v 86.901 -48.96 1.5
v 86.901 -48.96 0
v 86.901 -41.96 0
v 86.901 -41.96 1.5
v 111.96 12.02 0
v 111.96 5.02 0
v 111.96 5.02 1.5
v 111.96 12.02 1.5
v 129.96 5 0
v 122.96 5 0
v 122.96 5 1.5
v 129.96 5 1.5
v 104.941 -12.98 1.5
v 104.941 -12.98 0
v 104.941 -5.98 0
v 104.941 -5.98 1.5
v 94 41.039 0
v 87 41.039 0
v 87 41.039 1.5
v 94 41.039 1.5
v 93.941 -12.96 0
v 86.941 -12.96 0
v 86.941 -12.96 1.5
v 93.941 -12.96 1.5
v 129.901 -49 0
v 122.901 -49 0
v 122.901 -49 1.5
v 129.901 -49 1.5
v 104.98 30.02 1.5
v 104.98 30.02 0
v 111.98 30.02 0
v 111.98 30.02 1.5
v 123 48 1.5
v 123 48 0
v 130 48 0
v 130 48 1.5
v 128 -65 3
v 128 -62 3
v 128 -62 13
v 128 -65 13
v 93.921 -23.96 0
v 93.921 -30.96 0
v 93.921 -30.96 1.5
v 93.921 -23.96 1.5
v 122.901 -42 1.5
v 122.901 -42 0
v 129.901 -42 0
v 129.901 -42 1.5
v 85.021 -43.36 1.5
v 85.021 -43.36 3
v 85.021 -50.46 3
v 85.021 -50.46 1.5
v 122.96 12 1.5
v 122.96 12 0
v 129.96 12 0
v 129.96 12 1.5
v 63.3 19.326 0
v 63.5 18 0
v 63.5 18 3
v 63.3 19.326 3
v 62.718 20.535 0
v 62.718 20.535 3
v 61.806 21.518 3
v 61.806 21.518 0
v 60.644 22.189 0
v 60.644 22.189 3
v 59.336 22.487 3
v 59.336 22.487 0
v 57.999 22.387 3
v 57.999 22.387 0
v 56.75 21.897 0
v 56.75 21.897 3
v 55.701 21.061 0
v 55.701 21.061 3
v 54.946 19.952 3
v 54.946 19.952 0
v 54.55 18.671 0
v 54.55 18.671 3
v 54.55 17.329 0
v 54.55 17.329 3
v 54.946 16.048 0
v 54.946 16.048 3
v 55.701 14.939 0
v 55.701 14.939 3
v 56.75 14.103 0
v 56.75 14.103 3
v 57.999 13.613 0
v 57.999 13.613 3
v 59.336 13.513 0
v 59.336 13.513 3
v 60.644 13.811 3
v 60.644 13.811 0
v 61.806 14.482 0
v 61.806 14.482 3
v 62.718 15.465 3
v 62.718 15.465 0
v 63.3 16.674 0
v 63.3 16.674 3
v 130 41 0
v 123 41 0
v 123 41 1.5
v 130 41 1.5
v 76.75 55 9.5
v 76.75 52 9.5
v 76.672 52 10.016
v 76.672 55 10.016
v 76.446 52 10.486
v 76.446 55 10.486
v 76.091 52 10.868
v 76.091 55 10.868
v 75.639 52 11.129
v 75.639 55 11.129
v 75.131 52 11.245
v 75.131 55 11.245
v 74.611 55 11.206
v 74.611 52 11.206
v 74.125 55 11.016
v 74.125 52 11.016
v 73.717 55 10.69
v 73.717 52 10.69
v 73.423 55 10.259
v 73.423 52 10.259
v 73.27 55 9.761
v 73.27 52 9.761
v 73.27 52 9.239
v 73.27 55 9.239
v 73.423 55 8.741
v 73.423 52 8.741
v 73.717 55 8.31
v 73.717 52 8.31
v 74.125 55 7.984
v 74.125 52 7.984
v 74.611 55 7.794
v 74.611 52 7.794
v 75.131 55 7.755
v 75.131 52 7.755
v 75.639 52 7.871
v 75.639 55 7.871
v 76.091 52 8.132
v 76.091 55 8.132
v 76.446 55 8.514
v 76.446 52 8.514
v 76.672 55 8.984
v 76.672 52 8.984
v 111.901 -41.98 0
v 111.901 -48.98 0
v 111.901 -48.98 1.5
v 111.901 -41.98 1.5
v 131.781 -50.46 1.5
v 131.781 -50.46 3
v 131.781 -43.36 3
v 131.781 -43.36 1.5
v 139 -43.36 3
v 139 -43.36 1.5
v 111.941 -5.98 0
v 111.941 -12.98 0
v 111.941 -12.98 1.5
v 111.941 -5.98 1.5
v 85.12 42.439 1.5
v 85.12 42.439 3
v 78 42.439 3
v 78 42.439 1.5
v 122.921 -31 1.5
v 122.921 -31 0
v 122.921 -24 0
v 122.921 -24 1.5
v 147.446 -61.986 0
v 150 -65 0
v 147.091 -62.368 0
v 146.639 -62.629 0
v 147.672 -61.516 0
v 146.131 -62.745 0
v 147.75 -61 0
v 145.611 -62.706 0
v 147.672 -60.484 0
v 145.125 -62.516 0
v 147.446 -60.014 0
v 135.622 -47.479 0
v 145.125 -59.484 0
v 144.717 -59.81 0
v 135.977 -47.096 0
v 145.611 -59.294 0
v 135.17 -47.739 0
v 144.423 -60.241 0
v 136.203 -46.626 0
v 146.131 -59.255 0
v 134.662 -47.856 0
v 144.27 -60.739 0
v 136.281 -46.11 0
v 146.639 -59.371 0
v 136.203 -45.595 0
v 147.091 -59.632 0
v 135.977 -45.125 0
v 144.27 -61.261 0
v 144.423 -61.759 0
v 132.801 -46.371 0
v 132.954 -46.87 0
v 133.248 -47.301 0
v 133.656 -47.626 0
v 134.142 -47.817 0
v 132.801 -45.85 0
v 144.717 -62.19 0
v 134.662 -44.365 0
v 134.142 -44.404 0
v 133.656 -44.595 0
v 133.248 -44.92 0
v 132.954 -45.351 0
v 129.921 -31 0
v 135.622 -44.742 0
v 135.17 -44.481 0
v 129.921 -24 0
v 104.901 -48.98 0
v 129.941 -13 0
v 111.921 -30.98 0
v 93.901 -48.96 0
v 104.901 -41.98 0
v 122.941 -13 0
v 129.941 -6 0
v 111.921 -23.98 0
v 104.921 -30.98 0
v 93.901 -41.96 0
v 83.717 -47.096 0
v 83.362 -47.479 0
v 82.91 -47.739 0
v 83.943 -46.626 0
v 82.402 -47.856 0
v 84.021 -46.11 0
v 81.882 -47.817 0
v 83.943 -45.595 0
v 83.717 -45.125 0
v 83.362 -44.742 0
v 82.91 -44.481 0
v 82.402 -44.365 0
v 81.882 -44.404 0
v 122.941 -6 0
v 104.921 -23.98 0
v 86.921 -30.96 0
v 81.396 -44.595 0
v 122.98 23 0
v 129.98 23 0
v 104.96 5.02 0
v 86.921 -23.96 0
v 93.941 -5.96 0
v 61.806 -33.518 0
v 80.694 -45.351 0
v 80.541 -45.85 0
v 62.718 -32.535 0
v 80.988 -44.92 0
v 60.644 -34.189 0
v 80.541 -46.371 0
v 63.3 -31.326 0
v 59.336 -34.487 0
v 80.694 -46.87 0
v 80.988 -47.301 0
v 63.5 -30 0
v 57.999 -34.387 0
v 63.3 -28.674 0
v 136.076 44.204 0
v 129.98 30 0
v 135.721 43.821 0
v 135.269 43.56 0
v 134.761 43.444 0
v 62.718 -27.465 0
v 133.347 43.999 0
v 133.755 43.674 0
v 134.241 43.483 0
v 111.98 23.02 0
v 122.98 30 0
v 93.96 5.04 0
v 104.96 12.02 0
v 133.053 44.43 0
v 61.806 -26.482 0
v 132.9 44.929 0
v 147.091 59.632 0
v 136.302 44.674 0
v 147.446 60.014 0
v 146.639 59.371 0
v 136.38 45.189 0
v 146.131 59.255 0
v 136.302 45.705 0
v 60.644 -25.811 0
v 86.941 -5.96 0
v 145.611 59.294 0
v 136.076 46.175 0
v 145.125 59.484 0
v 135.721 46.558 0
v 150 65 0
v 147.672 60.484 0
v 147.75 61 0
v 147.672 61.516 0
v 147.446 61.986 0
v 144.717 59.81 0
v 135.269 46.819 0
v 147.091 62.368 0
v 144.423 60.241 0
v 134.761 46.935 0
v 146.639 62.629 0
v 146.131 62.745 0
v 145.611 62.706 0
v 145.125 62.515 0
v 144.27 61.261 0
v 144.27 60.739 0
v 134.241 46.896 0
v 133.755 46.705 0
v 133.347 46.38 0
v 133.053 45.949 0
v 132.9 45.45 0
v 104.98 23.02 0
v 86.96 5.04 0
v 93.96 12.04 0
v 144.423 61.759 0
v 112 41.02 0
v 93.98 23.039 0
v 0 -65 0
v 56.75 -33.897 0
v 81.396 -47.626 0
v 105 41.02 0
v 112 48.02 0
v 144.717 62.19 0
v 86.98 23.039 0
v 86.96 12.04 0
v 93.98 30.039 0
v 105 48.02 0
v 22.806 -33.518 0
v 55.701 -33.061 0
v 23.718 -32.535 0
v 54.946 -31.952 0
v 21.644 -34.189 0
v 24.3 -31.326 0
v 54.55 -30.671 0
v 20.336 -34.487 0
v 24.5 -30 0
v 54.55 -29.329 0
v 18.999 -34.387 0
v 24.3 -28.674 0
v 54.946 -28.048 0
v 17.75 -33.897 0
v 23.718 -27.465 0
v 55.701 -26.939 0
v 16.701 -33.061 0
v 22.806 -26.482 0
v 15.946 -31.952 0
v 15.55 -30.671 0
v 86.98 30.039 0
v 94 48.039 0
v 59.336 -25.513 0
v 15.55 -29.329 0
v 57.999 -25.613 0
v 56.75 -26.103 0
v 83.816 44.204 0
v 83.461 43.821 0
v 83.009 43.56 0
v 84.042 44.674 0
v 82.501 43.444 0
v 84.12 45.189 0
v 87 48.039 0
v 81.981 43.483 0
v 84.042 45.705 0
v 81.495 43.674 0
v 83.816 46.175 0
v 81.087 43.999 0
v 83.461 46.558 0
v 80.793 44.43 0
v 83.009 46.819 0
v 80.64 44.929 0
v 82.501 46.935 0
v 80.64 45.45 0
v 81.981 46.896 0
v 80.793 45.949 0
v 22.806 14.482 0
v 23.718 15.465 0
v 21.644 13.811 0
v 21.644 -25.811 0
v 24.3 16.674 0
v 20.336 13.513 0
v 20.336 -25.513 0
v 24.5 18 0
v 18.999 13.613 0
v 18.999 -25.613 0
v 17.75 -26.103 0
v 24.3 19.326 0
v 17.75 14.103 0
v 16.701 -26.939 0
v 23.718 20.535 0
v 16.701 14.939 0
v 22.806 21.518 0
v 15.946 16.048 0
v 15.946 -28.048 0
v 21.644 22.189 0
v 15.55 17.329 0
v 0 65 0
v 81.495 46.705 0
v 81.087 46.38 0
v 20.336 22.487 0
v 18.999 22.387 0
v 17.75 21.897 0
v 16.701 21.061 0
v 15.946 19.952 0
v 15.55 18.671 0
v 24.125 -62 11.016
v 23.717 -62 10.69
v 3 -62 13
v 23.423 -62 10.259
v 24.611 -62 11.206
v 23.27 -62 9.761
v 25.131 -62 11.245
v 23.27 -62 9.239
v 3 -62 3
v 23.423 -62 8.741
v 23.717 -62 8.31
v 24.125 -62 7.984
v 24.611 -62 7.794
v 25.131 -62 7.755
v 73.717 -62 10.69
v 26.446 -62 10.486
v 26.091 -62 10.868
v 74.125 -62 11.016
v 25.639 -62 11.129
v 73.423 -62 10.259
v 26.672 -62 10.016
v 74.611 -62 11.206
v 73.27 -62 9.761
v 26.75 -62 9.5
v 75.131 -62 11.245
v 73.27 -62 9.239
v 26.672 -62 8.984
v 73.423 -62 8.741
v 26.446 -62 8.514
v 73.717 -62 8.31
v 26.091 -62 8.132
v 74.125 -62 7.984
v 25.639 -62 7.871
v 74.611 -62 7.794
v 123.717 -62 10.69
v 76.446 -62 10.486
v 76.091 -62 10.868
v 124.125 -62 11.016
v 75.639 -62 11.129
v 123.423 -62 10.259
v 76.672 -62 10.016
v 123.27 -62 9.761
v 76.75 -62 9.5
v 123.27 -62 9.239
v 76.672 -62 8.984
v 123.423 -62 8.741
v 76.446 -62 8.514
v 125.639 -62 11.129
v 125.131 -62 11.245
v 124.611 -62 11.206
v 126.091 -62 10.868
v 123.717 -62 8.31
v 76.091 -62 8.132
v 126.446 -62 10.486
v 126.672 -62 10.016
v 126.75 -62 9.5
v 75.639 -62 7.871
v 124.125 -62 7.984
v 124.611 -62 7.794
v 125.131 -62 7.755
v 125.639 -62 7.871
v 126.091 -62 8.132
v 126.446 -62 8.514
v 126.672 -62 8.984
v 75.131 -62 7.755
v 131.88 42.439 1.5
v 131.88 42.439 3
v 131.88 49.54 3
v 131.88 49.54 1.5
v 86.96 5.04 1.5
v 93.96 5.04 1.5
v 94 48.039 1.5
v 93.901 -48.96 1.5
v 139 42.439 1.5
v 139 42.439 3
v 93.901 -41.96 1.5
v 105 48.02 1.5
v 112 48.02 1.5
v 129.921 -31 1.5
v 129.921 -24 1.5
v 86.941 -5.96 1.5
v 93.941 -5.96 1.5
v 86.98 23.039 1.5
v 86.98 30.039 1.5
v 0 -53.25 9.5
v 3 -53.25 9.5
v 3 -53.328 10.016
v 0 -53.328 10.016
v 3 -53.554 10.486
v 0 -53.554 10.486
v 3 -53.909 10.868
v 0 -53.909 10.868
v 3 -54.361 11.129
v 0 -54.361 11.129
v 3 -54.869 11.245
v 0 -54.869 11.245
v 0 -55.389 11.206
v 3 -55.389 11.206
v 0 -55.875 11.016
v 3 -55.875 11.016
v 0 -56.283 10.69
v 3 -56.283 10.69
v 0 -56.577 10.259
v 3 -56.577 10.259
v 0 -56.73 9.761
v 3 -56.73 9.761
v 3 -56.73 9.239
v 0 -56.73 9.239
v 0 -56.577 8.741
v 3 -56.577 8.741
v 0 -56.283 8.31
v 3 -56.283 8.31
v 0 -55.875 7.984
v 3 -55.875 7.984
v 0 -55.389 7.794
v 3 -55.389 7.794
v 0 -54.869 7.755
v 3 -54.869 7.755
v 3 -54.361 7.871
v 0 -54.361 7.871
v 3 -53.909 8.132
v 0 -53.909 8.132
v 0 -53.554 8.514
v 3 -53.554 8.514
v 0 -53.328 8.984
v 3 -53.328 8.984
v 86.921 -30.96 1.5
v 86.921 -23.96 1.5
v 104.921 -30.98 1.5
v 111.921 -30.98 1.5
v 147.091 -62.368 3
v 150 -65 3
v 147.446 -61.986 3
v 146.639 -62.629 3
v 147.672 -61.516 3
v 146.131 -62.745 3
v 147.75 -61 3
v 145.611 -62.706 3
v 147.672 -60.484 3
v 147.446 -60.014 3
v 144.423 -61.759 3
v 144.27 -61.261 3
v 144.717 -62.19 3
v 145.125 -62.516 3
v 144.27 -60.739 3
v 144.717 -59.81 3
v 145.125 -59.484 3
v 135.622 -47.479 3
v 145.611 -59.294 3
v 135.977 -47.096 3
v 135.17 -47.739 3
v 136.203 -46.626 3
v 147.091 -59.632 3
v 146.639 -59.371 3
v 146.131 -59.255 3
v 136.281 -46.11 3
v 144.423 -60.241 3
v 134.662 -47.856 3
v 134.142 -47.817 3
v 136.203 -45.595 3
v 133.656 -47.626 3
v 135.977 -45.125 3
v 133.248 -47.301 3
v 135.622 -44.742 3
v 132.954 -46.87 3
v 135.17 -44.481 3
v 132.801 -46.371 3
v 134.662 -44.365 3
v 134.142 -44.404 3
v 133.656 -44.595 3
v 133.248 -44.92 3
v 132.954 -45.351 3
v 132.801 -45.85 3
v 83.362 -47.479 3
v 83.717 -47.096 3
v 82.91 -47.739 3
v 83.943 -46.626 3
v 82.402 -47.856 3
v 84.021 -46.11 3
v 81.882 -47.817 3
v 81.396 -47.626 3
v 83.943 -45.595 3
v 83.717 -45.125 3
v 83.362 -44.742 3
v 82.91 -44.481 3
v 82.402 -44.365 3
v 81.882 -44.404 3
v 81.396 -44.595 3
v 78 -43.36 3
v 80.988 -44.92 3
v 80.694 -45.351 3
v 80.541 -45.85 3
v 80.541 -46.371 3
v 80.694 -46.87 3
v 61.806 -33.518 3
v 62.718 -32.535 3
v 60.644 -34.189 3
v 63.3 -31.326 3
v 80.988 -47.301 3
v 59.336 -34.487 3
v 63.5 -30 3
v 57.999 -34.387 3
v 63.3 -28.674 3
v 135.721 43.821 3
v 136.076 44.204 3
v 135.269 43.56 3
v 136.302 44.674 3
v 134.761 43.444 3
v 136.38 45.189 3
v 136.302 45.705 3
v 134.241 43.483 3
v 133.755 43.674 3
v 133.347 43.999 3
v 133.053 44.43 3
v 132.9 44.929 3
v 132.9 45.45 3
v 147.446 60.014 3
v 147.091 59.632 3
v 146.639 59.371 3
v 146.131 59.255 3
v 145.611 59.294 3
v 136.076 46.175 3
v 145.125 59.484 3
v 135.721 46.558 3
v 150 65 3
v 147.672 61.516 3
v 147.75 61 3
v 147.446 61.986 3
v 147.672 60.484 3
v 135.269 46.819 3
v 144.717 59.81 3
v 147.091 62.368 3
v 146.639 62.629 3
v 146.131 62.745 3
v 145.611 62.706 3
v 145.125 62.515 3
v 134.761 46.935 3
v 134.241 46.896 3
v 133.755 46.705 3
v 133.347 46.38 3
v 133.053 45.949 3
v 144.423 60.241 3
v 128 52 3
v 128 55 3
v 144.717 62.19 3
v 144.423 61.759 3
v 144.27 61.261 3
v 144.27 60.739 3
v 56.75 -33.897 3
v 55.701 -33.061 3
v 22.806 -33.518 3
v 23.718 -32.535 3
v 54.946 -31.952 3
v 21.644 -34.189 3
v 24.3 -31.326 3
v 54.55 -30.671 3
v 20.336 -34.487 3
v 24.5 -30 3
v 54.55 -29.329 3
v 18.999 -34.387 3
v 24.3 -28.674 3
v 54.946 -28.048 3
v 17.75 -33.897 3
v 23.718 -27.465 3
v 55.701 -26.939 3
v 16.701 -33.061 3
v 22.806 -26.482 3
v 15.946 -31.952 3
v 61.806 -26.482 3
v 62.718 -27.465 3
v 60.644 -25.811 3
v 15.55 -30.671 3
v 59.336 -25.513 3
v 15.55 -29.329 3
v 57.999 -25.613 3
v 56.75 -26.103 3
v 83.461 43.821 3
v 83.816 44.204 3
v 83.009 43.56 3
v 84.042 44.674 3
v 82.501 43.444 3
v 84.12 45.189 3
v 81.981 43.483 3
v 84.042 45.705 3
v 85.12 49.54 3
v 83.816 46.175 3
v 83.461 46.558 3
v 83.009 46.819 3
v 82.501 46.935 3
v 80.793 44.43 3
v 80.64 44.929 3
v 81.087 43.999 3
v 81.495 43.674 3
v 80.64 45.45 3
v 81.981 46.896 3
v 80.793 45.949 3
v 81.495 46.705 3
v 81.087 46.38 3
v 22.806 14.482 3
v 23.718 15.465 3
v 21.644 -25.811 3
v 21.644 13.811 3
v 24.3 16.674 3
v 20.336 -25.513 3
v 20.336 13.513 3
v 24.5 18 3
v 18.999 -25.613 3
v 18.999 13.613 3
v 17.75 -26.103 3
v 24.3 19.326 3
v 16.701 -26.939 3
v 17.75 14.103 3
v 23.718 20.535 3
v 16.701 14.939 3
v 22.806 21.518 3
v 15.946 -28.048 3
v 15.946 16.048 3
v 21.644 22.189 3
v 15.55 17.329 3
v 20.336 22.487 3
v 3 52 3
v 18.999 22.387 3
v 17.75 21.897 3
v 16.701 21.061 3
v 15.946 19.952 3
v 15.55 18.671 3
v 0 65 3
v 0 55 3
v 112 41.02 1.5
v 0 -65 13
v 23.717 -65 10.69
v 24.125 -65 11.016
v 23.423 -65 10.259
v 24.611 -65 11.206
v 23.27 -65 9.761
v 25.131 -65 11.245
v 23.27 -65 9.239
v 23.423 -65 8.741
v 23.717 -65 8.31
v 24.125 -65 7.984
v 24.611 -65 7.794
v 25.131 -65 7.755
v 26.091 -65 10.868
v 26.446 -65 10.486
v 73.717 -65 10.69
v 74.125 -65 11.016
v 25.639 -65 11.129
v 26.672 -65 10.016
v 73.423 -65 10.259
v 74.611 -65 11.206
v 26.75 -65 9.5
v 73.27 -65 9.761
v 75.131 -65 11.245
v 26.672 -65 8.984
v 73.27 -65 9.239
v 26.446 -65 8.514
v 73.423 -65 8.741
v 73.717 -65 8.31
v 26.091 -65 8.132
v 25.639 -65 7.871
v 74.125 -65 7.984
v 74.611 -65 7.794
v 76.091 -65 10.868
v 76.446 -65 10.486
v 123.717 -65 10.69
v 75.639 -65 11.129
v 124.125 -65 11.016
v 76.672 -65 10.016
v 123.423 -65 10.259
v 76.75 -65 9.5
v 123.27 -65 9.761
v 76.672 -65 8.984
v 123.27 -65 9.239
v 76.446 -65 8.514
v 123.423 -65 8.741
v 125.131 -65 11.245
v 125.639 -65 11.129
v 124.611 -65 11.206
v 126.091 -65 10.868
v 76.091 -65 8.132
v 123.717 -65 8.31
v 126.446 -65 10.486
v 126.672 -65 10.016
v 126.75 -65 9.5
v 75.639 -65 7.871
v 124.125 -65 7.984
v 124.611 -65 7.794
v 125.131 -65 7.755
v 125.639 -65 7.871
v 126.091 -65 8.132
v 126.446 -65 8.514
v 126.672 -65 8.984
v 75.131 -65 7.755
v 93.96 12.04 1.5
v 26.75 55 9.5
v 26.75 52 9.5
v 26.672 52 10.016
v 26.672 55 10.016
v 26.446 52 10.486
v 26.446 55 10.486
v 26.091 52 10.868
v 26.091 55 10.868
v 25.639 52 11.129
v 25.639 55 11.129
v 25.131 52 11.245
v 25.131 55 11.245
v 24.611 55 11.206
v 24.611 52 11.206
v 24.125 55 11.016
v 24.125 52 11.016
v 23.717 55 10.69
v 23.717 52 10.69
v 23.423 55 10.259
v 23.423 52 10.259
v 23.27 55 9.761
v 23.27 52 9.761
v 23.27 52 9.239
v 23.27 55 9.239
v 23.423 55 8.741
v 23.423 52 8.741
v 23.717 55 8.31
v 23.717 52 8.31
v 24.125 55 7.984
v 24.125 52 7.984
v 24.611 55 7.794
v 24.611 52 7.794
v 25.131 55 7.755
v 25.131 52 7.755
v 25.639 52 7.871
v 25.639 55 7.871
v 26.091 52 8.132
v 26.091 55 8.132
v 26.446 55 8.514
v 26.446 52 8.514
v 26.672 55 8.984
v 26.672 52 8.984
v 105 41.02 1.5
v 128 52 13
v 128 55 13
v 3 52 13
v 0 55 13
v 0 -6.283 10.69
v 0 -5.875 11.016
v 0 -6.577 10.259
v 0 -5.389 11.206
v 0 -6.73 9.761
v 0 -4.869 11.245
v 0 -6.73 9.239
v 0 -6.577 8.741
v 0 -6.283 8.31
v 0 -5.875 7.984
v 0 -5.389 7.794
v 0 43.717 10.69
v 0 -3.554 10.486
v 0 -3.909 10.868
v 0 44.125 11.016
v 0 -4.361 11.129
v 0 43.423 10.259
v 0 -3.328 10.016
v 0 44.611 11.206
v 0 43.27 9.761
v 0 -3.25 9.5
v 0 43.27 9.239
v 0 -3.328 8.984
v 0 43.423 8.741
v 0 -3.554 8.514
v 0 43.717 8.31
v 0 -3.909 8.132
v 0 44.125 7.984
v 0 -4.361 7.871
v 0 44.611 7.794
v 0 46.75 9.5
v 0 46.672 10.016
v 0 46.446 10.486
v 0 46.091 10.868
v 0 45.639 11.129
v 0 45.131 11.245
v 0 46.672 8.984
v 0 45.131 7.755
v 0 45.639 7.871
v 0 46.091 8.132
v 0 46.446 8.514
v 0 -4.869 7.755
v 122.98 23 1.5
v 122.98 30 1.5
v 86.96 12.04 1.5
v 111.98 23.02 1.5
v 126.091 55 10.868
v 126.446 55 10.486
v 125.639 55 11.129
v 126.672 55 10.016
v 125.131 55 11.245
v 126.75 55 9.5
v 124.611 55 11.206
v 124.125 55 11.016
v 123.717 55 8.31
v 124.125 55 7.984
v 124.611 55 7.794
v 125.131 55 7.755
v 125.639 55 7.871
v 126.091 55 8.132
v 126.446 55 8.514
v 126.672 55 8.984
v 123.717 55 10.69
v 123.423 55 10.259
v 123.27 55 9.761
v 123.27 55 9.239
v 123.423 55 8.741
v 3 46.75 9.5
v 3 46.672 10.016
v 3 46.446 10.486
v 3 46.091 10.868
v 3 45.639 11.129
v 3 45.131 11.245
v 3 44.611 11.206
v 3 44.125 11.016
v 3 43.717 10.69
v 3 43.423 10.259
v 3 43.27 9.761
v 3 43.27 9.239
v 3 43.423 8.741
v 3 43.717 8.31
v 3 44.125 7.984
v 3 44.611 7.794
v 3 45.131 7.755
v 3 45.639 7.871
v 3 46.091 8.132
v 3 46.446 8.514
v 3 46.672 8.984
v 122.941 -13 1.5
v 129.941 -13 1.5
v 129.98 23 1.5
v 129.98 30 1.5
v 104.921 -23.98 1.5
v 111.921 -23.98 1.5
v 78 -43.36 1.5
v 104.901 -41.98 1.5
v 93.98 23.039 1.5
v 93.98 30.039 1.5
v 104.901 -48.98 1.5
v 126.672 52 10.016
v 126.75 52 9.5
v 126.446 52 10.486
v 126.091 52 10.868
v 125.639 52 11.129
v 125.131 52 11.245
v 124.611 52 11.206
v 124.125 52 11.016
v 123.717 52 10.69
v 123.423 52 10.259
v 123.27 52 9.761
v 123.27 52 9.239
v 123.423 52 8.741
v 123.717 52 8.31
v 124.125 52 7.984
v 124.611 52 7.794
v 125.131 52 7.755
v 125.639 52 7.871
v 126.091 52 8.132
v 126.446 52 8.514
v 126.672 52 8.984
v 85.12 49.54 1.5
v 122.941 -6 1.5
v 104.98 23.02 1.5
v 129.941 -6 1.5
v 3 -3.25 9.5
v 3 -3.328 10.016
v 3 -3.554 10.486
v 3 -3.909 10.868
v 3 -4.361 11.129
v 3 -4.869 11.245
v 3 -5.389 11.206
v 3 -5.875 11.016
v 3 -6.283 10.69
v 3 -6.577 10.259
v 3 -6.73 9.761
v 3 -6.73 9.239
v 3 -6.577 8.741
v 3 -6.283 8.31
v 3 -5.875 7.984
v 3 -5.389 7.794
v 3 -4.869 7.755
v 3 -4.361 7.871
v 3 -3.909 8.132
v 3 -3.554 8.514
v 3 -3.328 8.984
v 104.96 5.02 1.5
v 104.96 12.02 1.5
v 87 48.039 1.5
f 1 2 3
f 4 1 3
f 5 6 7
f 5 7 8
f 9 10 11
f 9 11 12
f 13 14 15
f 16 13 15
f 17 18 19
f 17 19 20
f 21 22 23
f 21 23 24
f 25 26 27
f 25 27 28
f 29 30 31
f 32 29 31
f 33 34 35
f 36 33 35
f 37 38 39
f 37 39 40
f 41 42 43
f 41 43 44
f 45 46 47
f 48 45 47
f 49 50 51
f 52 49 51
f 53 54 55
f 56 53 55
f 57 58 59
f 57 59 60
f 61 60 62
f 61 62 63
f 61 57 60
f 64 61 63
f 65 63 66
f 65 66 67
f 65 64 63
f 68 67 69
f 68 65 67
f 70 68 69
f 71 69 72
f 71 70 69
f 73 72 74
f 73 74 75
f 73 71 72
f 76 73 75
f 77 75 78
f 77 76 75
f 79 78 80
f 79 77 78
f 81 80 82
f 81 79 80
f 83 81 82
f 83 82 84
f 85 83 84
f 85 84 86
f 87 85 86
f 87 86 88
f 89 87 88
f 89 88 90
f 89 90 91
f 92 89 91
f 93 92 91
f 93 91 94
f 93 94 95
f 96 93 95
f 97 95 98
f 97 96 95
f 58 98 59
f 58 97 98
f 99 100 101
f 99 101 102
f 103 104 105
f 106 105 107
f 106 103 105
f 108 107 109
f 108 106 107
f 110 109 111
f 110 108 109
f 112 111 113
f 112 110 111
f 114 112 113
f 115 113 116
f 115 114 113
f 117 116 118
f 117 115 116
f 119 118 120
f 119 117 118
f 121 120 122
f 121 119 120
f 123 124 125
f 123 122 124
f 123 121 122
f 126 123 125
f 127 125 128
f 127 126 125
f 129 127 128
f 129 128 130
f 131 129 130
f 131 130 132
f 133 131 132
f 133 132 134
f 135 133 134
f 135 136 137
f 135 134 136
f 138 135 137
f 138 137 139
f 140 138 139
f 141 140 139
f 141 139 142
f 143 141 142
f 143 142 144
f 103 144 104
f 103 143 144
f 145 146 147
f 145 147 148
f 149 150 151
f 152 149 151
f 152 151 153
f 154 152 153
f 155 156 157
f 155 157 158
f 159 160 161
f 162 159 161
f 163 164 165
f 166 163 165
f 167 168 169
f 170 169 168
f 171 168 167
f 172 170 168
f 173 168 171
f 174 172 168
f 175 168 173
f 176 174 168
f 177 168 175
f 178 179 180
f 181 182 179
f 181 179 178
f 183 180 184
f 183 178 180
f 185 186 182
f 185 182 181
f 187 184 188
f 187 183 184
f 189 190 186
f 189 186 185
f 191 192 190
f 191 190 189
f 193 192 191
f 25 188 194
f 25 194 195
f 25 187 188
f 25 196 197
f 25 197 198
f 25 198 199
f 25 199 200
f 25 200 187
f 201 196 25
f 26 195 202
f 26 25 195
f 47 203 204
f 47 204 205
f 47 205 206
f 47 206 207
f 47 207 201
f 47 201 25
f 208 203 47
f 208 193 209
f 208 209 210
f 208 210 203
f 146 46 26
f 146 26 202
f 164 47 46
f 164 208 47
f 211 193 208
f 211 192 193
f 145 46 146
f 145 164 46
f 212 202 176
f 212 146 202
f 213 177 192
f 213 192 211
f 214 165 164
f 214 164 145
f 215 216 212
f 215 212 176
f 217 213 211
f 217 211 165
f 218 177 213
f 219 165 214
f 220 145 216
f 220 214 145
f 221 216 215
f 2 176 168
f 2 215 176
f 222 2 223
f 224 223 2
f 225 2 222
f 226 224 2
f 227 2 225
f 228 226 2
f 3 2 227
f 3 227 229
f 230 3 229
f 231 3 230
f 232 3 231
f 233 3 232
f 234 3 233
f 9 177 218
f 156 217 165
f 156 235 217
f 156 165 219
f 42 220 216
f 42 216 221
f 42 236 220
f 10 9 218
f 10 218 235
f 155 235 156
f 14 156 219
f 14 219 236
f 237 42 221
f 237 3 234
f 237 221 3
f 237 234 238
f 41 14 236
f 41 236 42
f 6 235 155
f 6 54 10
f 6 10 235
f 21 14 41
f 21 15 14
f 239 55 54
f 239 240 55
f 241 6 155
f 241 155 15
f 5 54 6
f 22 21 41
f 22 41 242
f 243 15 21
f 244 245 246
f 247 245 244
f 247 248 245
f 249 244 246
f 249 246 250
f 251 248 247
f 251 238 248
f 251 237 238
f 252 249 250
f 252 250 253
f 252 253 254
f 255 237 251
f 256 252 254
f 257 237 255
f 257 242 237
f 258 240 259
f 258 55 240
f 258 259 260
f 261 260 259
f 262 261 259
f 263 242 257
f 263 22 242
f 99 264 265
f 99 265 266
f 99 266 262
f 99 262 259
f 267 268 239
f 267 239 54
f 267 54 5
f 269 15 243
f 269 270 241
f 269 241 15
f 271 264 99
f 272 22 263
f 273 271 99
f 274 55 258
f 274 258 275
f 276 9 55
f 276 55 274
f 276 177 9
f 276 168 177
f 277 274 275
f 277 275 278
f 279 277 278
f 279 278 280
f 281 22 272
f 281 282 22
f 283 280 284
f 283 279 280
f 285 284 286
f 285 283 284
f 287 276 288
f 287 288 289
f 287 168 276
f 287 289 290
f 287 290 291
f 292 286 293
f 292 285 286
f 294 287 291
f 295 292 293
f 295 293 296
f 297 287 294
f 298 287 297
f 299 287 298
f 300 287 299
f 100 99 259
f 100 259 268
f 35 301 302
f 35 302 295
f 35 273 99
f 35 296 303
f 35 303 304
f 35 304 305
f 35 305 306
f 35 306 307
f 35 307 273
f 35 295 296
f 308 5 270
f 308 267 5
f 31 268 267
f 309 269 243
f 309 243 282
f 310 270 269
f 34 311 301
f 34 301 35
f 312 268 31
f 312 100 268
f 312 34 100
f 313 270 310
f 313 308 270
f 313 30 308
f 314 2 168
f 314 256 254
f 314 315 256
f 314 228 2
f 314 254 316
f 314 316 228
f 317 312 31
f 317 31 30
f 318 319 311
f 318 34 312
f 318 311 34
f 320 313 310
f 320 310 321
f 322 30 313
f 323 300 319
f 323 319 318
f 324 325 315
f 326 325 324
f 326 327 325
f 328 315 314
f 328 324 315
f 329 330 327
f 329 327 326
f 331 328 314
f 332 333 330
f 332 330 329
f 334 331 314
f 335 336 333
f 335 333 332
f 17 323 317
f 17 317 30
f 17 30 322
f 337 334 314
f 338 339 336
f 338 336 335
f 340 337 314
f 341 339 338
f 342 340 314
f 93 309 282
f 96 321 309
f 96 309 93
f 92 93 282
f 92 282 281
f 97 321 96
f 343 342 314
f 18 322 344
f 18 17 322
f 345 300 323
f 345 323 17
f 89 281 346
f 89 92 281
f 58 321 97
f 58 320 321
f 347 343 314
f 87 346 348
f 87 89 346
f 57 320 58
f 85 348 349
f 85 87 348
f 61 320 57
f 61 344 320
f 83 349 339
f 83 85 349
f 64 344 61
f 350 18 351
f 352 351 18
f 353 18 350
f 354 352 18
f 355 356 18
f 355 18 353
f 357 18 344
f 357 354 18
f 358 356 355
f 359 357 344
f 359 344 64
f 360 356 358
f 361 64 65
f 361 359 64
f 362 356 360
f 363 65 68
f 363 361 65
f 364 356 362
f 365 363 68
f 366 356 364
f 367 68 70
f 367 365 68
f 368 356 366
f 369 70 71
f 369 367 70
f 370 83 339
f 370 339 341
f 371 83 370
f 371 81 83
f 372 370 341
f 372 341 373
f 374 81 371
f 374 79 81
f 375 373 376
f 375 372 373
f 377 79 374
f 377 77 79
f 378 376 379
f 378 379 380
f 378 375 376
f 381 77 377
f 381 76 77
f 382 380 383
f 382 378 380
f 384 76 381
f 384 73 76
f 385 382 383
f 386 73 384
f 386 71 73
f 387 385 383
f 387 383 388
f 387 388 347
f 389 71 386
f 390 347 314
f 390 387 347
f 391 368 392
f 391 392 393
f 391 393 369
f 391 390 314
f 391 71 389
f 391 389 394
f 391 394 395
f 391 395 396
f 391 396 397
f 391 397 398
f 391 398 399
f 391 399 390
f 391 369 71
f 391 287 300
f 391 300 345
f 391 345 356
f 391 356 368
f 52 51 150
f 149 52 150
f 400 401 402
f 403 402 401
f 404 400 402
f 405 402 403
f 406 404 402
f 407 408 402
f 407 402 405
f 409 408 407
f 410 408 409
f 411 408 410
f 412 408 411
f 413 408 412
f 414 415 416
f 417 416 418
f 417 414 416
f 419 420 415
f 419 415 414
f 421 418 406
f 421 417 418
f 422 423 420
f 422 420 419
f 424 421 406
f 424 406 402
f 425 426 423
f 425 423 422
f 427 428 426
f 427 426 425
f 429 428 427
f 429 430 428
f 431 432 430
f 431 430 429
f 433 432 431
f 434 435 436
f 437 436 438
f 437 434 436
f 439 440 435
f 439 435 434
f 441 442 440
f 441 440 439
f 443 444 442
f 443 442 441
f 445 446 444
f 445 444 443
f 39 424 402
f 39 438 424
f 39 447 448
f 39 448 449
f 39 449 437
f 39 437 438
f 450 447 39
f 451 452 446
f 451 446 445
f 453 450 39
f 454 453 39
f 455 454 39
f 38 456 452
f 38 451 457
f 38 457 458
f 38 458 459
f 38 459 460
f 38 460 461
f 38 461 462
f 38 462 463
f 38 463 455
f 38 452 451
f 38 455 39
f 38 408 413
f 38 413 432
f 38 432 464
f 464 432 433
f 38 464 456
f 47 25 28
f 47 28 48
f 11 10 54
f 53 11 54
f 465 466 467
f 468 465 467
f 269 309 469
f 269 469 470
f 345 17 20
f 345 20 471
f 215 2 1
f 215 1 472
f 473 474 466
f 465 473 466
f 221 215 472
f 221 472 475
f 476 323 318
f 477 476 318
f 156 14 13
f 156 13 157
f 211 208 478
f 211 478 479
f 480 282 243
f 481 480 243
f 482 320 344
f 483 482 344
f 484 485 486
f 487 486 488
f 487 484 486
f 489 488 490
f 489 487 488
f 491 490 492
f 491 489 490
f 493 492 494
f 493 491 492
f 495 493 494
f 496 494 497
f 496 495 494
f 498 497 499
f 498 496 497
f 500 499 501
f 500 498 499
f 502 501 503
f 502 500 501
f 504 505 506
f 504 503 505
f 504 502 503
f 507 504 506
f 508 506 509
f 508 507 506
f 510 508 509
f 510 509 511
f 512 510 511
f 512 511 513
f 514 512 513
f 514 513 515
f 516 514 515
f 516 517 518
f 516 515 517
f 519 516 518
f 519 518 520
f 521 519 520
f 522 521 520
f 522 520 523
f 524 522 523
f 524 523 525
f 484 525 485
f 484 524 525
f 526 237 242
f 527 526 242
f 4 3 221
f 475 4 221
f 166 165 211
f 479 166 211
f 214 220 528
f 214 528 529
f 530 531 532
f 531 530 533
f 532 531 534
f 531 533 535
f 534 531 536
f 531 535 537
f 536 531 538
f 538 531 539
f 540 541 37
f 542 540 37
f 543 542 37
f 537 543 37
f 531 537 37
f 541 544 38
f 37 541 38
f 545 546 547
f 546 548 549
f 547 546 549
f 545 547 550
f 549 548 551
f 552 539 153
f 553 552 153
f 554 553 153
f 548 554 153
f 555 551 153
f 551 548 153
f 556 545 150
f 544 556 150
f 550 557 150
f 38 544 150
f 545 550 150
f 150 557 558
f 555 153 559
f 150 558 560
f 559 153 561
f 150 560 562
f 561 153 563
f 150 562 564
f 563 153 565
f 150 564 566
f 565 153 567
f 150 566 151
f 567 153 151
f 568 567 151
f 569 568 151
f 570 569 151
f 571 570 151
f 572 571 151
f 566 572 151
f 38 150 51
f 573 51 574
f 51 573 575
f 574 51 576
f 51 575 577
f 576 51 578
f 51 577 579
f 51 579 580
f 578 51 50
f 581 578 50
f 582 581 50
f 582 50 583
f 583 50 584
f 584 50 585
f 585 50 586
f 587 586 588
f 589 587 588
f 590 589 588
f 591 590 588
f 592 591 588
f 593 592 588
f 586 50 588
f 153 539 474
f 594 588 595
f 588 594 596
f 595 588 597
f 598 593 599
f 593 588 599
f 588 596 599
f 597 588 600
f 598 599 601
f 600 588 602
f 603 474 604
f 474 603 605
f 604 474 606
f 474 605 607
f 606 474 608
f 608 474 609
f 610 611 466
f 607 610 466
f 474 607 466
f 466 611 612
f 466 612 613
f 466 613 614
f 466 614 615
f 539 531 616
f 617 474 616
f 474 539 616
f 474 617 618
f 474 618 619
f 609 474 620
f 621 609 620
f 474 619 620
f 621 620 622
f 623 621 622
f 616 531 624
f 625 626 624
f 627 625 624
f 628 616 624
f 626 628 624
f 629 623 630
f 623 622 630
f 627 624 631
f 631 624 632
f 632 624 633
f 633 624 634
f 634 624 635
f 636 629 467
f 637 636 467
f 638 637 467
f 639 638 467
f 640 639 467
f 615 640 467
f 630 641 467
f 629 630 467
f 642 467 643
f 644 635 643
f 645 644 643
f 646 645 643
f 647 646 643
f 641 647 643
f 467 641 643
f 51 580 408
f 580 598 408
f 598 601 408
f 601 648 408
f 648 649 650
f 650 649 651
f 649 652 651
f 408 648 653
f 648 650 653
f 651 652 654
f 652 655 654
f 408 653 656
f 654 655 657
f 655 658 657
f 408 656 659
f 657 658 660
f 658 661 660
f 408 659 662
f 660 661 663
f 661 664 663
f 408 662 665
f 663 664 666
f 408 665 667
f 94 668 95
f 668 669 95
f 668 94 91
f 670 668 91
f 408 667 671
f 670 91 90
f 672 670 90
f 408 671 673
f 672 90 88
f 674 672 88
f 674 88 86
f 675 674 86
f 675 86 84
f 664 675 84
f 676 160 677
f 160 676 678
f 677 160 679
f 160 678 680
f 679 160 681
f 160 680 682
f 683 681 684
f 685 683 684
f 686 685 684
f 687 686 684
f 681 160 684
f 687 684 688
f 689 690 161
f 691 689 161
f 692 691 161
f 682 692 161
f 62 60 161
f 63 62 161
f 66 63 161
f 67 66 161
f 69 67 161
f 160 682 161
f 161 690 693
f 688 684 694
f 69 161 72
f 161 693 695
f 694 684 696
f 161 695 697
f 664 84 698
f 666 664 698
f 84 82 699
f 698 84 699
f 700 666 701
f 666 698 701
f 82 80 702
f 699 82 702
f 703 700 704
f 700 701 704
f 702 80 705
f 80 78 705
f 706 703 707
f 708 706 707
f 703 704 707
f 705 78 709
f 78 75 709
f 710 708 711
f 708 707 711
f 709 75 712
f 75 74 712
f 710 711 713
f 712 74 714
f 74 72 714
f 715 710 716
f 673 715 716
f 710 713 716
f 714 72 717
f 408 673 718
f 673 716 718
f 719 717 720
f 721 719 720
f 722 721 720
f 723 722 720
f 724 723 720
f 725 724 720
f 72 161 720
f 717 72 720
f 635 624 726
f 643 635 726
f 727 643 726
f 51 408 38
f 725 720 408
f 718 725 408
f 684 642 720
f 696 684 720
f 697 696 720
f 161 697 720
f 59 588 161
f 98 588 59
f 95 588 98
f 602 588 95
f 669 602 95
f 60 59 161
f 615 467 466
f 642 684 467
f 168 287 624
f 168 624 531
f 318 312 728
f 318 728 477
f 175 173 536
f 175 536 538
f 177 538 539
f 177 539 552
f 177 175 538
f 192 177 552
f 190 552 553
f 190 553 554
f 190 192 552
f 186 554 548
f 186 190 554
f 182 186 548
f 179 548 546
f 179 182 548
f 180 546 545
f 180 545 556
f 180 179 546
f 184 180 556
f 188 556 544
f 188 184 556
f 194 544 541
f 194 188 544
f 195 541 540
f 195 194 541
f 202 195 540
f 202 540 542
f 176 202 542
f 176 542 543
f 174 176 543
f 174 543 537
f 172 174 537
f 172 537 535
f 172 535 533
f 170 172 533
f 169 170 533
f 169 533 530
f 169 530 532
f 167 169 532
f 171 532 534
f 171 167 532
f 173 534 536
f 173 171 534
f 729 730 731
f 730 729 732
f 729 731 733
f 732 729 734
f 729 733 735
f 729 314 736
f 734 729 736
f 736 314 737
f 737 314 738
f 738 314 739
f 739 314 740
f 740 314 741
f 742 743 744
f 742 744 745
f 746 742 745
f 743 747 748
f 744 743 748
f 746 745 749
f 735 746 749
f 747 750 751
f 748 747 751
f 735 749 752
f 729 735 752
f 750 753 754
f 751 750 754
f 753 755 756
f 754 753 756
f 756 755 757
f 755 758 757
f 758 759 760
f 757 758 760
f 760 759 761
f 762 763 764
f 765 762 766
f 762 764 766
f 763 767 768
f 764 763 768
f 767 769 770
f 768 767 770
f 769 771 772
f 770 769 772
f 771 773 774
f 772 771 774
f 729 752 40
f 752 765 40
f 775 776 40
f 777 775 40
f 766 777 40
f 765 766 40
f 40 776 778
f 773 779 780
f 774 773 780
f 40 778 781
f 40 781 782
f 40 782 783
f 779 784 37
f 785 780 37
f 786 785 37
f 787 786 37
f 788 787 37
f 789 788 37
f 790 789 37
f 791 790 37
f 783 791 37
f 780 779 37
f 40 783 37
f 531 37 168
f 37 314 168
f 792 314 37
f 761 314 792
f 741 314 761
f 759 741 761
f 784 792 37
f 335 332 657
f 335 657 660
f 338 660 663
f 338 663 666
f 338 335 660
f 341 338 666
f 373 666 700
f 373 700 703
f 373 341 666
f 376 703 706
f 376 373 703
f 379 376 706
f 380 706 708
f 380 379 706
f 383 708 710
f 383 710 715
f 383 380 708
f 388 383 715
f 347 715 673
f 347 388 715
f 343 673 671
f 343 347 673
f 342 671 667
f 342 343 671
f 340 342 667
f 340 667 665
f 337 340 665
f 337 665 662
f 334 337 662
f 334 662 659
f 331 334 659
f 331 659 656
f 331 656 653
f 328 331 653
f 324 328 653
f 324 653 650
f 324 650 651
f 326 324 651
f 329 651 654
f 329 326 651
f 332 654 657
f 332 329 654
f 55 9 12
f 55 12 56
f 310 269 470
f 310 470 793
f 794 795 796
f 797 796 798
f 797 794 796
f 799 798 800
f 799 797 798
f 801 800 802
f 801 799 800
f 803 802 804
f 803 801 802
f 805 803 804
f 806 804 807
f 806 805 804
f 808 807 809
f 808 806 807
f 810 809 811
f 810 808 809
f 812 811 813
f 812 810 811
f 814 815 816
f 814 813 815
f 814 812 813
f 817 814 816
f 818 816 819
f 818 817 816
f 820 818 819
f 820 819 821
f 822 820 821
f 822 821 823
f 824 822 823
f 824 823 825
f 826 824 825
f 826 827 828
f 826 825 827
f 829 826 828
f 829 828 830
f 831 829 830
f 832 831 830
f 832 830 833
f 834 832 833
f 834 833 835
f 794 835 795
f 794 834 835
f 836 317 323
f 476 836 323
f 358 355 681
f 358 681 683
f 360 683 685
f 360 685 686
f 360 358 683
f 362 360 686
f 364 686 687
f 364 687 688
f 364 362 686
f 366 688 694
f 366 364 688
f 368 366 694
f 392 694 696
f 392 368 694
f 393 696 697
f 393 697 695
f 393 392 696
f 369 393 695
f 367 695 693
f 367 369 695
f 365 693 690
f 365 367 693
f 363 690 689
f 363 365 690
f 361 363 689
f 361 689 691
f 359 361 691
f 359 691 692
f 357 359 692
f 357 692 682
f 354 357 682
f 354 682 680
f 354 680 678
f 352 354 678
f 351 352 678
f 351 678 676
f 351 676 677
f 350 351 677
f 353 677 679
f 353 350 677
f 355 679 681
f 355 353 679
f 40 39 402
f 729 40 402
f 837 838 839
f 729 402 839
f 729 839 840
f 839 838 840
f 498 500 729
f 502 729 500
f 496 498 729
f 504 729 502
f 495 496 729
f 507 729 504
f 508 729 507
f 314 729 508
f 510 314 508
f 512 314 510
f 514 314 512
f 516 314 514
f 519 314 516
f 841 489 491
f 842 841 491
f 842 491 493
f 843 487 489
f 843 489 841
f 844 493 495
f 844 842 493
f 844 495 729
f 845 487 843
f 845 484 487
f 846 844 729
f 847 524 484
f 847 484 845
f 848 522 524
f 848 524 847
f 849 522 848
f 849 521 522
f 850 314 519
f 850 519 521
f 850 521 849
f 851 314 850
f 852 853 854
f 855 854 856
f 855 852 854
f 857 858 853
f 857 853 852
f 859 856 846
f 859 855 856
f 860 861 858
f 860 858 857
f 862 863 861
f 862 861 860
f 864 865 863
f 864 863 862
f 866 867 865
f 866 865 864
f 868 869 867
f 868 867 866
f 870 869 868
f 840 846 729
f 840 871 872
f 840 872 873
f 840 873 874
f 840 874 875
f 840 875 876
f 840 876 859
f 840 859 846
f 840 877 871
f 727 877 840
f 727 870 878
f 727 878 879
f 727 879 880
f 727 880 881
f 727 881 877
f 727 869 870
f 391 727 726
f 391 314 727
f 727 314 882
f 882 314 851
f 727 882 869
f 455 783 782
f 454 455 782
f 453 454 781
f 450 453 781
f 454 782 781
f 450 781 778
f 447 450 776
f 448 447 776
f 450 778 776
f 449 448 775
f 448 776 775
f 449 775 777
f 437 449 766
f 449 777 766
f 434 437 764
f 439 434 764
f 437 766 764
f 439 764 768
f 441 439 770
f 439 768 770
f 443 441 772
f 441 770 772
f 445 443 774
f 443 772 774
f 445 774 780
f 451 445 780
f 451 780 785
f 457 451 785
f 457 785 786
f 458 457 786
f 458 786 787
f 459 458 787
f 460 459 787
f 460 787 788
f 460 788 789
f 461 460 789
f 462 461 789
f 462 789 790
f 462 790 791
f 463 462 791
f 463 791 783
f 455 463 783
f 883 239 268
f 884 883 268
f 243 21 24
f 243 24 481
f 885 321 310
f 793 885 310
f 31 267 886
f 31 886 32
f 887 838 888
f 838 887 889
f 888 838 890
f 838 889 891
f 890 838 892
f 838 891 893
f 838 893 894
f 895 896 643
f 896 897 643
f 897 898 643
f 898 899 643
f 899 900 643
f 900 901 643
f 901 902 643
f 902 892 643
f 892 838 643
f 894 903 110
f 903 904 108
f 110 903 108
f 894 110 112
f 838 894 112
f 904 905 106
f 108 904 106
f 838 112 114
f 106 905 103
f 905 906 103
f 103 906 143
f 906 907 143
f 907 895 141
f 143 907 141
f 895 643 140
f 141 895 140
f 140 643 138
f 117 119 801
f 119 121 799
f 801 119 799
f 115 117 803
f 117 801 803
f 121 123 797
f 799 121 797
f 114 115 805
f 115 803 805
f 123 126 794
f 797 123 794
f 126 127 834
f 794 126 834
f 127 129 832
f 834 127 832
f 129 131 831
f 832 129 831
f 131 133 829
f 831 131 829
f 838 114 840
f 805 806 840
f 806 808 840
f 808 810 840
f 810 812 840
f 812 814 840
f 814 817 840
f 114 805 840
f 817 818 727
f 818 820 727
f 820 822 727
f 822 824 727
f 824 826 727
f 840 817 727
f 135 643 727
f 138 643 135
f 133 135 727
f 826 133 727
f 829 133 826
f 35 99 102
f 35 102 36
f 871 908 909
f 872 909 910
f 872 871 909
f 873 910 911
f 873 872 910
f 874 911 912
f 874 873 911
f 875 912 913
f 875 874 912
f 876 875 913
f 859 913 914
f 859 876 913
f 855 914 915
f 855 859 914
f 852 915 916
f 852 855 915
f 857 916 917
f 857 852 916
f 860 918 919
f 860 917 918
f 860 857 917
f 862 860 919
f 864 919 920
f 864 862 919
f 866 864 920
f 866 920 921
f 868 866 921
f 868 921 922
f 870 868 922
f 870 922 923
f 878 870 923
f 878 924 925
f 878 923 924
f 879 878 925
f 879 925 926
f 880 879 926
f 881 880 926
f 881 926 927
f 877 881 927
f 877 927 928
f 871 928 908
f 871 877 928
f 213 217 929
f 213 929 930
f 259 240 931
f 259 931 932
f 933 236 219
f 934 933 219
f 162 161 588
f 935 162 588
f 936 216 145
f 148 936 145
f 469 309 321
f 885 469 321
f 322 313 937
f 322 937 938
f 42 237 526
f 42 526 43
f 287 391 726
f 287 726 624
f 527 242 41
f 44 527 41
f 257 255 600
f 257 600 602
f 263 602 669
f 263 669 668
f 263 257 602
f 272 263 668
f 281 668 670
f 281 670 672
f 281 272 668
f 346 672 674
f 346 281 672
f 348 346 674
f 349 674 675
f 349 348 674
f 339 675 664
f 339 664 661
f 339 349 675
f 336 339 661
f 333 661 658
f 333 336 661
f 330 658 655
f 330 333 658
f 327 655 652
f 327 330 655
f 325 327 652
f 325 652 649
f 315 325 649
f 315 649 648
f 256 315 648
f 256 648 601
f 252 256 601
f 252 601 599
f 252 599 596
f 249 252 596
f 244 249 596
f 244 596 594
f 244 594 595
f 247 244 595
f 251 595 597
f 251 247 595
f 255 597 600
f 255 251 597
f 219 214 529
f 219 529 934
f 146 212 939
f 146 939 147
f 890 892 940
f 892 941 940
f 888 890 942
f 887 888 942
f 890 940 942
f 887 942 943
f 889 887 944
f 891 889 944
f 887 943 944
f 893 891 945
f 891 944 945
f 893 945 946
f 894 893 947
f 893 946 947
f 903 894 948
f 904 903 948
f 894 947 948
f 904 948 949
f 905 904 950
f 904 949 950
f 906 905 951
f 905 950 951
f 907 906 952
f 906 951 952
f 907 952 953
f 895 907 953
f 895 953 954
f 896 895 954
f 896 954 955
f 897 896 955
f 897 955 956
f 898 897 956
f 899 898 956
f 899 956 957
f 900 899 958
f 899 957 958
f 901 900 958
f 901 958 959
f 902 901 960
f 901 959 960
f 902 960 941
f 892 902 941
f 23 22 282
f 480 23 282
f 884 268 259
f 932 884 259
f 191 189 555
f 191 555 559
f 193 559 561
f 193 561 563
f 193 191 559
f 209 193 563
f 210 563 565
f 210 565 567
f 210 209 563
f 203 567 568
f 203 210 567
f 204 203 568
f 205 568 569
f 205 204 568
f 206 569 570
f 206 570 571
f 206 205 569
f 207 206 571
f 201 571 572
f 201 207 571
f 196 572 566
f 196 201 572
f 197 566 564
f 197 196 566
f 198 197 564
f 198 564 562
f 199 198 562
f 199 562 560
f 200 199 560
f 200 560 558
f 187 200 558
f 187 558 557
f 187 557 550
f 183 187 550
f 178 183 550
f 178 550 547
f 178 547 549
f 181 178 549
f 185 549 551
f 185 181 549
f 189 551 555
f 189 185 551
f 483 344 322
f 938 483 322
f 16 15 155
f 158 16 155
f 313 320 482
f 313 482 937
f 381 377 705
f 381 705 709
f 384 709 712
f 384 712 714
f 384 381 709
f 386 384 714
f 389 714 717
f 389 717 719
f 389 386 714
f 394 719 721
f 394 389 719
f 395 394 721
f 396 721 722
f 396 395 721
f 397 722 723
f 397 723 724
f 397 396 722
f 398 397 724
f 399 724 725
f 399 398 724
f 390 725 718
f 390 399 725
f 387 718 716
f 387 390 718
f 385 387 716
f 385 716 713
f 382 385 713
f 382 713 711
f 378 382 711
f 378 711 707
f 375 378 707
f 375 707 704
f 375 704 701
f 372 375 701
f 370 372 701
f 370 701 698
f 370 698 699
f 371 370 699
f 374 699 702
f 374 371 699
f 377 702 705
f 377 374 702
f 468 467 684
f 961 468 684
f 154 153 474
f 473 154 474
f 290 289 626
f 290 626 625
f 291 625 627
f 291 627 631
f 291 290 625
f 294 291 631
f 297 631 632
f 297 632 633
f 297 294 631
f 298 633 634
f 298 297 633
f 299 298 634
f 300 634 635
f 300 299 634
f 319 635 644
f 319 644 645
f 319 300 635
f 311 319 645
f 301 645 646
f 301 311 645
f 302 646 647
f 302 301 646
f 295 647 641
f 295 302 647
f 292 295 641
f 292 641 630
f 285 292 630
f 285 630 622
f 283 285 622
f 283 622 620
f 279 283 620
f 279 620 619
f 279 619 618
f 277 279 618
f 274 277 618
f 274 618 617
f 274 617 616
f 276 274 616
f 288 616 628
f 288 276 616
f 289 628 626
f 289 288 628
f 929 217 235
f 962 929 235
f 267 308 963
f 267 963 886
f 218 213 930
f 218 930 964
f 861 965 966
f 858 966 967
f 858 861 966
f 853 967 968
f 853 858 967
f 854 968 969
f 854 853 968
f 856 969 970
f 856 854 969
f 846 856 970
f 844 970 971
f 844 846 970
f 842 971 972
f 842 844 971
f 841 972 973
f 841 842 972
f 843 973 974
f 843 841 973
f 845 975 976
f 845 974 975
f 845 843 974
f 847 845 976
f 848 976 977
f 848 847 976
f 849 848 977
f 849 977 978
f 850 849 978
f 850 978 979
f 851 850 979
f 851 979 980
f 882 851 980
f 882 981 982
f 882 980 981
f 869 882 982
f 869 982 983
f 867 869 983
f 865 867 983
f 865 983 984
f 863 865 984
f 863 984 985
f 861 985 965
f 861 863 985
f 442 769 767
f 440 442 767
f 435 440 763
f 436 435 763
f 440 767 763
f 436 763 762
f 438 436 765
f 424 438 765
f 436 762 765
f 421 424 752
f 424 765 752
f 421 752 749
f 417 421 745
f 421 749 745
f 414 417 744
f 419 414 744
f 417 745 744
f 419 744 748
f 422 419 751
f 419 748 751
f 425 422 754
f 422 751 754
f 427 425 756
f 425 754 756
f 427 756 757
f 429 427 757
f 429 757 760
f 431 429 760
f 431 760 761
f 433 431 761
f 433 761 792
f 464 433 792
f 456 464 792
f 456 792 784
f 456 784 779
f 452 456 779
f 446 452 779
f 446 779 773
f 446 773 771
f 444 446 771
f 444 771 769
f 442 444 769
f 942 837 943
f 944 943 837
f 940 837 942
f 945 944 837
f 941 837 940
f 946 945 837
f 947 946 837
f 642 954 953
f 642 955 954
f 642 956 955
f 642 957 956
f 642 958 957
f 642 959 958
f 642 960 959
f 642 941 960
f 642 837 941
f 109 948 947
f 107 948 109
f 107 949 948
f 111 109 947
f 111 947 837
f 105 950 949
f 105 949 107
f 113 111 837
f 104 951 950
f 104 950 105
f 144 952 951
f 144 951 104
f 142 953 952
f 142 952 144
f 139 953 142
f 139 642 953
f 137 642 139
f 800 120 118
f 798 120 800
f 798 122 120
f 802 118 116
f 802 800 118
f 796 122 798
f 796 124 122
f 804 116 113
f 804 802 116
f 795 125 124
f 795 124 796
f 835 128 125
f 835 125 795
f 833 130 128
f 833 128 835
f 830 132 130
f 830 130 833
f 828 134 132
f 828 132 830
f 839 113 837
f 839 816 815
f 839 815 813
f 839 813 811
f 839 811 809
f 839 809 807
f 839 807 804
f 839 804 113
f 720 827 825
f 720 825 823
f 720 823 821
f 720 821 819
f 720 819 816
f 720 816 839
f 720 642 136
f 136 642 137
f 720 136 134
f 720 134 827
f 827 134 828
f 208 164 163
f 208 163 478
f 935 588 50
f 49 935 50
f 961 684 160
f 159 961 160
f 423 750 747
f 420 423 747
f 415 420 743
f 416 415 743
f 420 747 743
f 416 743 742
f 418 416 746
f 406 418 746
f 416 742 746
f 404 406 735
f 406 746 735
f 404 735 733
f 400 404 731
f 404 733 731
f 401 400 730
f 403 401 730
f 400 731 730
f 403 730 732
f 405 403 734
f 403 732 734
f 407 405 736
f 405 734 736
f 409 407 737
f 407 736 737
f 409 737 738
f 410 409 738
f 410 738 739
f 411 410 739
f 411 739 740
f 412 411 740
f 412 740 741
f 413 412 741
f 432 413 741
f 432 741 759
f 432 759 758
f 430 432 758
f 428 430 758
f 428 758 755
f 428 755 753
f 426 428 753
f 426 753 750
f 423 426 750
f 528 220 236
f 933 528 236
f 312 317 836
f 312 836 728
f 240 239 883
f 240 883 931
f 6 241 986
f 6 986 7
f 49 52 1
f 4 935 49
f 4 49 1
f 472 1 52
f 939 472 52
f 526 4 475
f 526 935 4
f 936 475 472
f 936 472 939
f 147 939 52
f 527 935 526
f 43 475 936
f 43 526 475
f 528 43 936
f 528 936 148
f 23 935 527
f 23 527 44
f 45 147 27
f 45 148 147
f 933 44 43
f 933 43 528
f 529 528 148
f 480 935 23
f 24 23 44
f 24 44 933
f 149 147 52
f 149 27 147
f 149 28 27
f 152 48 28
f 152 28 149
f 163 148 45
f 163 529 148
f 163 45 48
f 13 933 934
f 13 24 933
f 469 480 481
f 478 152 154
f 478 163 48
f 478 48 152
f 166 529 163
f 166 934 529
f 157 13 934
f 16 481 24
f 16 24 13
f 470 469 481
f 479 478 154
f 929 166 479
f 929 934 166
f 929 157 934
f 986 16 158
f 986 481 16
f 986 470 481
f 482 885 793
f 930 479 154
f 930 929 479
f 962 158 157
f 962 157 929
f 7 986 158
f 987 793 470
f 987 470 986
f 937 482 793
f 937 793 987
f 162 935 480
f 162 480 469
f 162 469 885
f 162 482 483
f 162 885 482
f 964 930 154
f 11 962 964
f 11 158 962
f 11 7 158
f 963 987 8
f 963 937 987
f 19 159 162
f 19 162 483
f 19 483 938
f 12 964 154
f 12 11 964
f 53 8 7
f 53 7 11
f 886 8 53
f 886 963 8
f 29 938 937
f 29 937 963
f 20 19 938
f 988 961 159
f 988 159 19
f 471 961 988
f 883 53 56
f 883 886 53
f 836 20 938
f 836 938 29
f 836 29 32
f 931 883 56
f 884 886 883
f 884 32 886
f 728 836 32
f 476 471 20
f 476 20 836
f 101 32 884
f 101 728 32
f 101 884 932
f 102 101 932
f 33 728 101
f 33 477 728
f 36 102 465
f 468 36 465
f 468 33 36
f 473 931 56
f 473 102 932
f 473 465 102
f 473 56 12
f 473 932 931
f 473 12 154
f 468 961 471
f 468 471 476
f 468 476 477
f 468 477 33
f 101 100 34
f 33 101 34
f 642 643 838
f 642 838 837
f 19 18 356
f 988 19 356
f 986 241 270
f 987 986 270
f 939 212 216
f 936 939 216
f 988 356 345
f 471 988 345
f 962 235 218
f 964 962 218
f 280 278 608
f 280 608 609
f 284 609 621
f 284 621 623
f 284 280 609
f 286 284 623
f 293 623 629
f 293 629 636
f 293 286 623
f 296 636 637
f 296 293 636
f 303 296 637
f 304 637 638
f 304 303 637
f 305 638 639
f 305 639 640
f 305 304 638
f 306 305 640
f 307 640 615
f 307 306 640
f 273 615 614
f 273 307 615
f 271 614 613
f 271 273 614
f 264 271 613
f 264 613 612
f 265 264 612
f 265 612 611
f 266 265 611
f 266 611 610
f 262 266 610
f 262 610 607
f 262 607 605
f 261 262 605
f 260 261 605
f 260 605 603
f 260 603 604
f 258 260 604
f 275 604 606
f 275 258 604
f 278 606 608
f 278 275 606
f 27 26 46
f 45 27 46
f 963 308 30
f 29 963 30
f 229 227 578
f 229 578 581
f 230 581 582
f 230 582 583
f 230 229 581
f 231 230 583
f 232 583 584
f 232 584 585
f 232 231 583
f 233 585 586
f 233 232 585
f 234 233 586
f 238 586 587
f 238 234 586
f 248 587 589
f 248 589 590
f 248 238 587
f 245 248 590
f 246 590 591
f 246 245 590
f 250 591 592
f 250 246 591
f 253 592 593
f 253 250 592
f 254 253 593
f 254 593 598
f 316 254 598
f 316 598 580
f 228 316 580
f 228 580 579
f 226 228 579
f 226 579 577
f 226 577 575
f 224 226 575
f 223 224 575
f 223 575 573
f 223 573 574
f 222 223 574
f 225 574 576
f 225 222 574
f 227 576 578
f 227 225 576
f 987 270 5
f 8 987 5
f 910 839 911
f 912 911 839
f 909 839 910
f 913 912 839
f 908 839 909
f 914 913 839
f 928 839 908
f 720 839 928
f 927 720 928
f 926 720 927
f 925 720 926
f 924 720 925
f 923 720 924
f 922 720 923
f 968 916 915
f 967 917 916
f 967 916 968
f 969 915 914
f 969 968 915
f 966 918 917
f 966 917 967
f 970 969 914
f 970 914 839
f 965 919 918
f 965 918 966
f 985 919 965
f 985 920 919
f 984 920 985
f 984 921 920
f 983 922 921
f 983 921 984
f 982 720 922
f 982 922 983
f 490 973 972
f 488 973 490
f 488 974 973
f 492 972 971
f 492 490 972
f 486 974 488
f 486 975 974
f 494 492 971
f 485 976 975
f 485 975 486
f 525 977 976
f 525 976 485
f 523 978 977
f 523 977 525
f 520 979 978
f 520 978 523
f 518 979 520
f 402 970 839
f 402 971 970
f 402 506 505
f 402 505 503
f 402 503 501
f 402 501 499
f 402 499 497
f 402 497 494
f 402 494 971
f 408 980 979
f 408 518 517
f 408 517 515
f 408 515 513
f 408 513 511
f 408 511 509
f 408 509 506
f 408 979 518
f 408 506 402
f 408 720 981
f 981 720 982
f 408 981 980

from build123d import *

# Parameters (mm, degrees)
SKETCH013_R     = 4.5
SKETCH013_R_2   = 1.75
SKETCH013_W     = 7
SKETCH013_H     = 7
PAD004_DEPTH    = 3
PAD_DEPTH       = 10
SKETCH015_R     = 1.75
POCKET005_DEPTH = 5
SKETCH004_R     = 1.75
POCKET006_DEPTH = 5
SKETCH014_R     = 1.75
POCKET007_DEPTH = 5
POCKET_DEPTH    = 2


with BuildPart() as part:
    # Sketch013 → Pad004 (new body)
    with BuildSketch(Plane.XY):
        Polygon((0, 65), (150, 64.999907), (150, -65), (0, -65), align=None)
        with Locations((20, 18)):
            Circle(SKETCH013_R, mode=Mode.SUBTRACT)
        with Locations((59, 18)):
            Circle(SKETCH013_R, mode=Mode.SUBTRACT)
        with Locations((20, -30)):
            Circle(SKETCH013_R, mode=Mode.SUBTRACT)
        with Locations((59, -30)):
            Circle(SKETCH013_R, mode=Mode.SUBTRACT)
        with Locations((146, 60.999907)):
            Circle(SKETCH013_R_2, mode=Mode.SUBTRACT)
        with Locations((146, -61)):
            Circle(SKETCH013_R_2, mode=Mode.SUBTRACT)
        with Locations((82.370022, 45.189481)):
            Circle(SKETCH013_R_2, mode=Mode.SUBTRACT)
        with Locations((134.63, 45.189481)):
            Circle(SKETCH013_R_2, mode=Mode.SUBTRACT)
        with Locations((82.271087, -46.110465)):
            Circle(SKETCH013_R_2, mode=Mode.SUBTRACT)
        with Locations((134.531066, -46.110465)):
            Circle(SKETCH013_R_2, mode=Mode.SUBTRACT)
        with Locations((90.500022, 44.539481)):
            Rectangle(SKETCH013_W, SKETCH013_H, mode=Mode.SUBTRACT)
        with Locations((108.500011, 44.519694)):
            Rectangle(SKETCH013_W, SKETCH013_H, mode=Mode.SUBTRACT)
        with Locations((126.5, 44.499907)):
            Rectangle(SKETCH013_W, SKETCH013_H, mode=Mode.SUBTRACT)
        with Locations((90.480235, 26.539492)):
            Rectangle(SKETCH013_W, SKETCH013_H, mode=Mode.SUBTRACT)
        with Locations((108.480224, 26.519705)):
            Rectangle(SKETCH013_W, SKETCH013_H, mode=Mode.SUBTRACT)
        with Locations((126.480213, 26.499918)):
            Rectangle(SKETCH013_W, SKETCH013_H, mode=Mode.SUBTRACT)
        with Locations((90.460448, 8.539503)):
            Rectangle(SKETCH013_W, SKETCH013_H, mode=Mode.SUBTRACT)
        with Locations((108.460437, 8.519716)):
            Rectangle(SKETCH013_W, SKETCH013_H, mode=Mode.SUBTRACT)
        with Locations((126.460426, 8.499929)):
            Rectangle(SKETCH013_W, SKETCH013_H, mode=Mode.SUBTRACT)
        with Locations((90.440661, -9.460486)):
            Rectangle(SKETCH013_W, SKETCH013_H, mode=Mode.SUBTRACT)
        with Locations((108.44065, -9.480273)):
            Rectangle(SKETCH013_W, SKETCH013_H, mode=Mode.SUBTRACT)
        with Locations((126.440639, -9.50006)):
            Rectangle(SKETCH013_W, SKETCH013_H, mode=Mode.SUBTRACT)
        with Locations((90.420874, -27.460475)):
            Rectangle(SKETCH013_W, SKETCH013_H, mode=Mode.SUBTRACT)
        with Locations((108.420863, -27.480262)):
            Rectangle(SKETCH013_W, SKETCH013_H, mode=Mode.SUBTRACT)
        with Locations((126.420852, -27.500049)):
            Rectangle(SKETCH013_W, SKETCH013_H, mode=Mode.SUBTRACT)
        with Locations((90.401087, -45.460465)):
            Rectangle(SKETCH013_W, SKETCH013_H, mode=Mode.SUBTRACT)
        with Locations((108.401076, -45.480251)):
            Rectangle(SKETCH013_W, SKETCH013_H, mode=Mode.SUBTRACT)
        with Locations((126.401066, -45.500038)):
            Rectangle(SKETCH013_W, SKETCH013_H, mode=Mode.SUBTRACT)
    extrude(amount=PAD004_DEPTH)

    # Sketch001 (on DatumPlane) → Pad (join)
    with BuildSketch(Plane.XY.offset(3)):
        Polygon((0, 55), (3, 55), (128, 55), (128, 52), (3, 52), (3, -62), (128, -62), (128, -65), (3, -65), (0, -65), align=None)
    extrude(amount=PAD_DEPTH)

    # Sketch015 → Pocket005 (cut)
    with BuildSketch(Plane.XZ.offset(65)):
        with Locations((25, 9.5)):
            Circle(SKETCH015_R)
        with Locations((75, 9.5)):
            Circle(SKETCH015_R)
        with Locations((125, 9.5)):
            Circle(SKETCH015_R)
    extrude(amount=-POCKET005_DEPTH, mode=Mode.SUBTRACT)

    # Sketch004 (on DatumPlane) → Pocket006 (cut, symmetric)
    with BuildSketch(Plane.XZ.offset(-55)):
        with Locations((25, 9.5)):
            Circle(SKETCH004_R)
        with Locations((75, 9.5)):
            Circle(SKETCH004_R)
        with Locations((125, 9.5)):
            Circle(SKETCH004_R)
    extrude(amount=POCKET006_DEPTH, both=True, mode=Mode.SUBTRACT)

    # Sketch014 → Pocket007 (cut)
    with BuildSketch(Plane.YZ):
        with Locations((45, 9.5)):
            Circle(SKETCH014_R)
        with Locations((-5, 9.5)):
            Circle(SKETCH014_R)
        with Locations((-55, 9.5)):
            Circle(SKETCH014_R)
    extrude(amount=POCKET007_DEPTH, mode=Mode.SUBTRACT)

    # Sketch → Pocket (cut)
    with BuildSketch(Plane.XY.offset(3.5)):
        Polygon((85.120022, 49.539508), (85.120022, 42.439481), (78.000011, 42.439481), (78.000011, -43.360465), (85.021087, -43.360465), (85.021087, -50.460443), (131.781066, -50.460443), (131.781066, -43.360465), (139.000011, -43.360465), (139.000011, 42.439481), (131.88, 42.439481), (131.88, 49.539508), align=None)
    extrude(amount=-POCKET_DEPTH, mode=Mode.SUBTRACT)


solid = part.part
